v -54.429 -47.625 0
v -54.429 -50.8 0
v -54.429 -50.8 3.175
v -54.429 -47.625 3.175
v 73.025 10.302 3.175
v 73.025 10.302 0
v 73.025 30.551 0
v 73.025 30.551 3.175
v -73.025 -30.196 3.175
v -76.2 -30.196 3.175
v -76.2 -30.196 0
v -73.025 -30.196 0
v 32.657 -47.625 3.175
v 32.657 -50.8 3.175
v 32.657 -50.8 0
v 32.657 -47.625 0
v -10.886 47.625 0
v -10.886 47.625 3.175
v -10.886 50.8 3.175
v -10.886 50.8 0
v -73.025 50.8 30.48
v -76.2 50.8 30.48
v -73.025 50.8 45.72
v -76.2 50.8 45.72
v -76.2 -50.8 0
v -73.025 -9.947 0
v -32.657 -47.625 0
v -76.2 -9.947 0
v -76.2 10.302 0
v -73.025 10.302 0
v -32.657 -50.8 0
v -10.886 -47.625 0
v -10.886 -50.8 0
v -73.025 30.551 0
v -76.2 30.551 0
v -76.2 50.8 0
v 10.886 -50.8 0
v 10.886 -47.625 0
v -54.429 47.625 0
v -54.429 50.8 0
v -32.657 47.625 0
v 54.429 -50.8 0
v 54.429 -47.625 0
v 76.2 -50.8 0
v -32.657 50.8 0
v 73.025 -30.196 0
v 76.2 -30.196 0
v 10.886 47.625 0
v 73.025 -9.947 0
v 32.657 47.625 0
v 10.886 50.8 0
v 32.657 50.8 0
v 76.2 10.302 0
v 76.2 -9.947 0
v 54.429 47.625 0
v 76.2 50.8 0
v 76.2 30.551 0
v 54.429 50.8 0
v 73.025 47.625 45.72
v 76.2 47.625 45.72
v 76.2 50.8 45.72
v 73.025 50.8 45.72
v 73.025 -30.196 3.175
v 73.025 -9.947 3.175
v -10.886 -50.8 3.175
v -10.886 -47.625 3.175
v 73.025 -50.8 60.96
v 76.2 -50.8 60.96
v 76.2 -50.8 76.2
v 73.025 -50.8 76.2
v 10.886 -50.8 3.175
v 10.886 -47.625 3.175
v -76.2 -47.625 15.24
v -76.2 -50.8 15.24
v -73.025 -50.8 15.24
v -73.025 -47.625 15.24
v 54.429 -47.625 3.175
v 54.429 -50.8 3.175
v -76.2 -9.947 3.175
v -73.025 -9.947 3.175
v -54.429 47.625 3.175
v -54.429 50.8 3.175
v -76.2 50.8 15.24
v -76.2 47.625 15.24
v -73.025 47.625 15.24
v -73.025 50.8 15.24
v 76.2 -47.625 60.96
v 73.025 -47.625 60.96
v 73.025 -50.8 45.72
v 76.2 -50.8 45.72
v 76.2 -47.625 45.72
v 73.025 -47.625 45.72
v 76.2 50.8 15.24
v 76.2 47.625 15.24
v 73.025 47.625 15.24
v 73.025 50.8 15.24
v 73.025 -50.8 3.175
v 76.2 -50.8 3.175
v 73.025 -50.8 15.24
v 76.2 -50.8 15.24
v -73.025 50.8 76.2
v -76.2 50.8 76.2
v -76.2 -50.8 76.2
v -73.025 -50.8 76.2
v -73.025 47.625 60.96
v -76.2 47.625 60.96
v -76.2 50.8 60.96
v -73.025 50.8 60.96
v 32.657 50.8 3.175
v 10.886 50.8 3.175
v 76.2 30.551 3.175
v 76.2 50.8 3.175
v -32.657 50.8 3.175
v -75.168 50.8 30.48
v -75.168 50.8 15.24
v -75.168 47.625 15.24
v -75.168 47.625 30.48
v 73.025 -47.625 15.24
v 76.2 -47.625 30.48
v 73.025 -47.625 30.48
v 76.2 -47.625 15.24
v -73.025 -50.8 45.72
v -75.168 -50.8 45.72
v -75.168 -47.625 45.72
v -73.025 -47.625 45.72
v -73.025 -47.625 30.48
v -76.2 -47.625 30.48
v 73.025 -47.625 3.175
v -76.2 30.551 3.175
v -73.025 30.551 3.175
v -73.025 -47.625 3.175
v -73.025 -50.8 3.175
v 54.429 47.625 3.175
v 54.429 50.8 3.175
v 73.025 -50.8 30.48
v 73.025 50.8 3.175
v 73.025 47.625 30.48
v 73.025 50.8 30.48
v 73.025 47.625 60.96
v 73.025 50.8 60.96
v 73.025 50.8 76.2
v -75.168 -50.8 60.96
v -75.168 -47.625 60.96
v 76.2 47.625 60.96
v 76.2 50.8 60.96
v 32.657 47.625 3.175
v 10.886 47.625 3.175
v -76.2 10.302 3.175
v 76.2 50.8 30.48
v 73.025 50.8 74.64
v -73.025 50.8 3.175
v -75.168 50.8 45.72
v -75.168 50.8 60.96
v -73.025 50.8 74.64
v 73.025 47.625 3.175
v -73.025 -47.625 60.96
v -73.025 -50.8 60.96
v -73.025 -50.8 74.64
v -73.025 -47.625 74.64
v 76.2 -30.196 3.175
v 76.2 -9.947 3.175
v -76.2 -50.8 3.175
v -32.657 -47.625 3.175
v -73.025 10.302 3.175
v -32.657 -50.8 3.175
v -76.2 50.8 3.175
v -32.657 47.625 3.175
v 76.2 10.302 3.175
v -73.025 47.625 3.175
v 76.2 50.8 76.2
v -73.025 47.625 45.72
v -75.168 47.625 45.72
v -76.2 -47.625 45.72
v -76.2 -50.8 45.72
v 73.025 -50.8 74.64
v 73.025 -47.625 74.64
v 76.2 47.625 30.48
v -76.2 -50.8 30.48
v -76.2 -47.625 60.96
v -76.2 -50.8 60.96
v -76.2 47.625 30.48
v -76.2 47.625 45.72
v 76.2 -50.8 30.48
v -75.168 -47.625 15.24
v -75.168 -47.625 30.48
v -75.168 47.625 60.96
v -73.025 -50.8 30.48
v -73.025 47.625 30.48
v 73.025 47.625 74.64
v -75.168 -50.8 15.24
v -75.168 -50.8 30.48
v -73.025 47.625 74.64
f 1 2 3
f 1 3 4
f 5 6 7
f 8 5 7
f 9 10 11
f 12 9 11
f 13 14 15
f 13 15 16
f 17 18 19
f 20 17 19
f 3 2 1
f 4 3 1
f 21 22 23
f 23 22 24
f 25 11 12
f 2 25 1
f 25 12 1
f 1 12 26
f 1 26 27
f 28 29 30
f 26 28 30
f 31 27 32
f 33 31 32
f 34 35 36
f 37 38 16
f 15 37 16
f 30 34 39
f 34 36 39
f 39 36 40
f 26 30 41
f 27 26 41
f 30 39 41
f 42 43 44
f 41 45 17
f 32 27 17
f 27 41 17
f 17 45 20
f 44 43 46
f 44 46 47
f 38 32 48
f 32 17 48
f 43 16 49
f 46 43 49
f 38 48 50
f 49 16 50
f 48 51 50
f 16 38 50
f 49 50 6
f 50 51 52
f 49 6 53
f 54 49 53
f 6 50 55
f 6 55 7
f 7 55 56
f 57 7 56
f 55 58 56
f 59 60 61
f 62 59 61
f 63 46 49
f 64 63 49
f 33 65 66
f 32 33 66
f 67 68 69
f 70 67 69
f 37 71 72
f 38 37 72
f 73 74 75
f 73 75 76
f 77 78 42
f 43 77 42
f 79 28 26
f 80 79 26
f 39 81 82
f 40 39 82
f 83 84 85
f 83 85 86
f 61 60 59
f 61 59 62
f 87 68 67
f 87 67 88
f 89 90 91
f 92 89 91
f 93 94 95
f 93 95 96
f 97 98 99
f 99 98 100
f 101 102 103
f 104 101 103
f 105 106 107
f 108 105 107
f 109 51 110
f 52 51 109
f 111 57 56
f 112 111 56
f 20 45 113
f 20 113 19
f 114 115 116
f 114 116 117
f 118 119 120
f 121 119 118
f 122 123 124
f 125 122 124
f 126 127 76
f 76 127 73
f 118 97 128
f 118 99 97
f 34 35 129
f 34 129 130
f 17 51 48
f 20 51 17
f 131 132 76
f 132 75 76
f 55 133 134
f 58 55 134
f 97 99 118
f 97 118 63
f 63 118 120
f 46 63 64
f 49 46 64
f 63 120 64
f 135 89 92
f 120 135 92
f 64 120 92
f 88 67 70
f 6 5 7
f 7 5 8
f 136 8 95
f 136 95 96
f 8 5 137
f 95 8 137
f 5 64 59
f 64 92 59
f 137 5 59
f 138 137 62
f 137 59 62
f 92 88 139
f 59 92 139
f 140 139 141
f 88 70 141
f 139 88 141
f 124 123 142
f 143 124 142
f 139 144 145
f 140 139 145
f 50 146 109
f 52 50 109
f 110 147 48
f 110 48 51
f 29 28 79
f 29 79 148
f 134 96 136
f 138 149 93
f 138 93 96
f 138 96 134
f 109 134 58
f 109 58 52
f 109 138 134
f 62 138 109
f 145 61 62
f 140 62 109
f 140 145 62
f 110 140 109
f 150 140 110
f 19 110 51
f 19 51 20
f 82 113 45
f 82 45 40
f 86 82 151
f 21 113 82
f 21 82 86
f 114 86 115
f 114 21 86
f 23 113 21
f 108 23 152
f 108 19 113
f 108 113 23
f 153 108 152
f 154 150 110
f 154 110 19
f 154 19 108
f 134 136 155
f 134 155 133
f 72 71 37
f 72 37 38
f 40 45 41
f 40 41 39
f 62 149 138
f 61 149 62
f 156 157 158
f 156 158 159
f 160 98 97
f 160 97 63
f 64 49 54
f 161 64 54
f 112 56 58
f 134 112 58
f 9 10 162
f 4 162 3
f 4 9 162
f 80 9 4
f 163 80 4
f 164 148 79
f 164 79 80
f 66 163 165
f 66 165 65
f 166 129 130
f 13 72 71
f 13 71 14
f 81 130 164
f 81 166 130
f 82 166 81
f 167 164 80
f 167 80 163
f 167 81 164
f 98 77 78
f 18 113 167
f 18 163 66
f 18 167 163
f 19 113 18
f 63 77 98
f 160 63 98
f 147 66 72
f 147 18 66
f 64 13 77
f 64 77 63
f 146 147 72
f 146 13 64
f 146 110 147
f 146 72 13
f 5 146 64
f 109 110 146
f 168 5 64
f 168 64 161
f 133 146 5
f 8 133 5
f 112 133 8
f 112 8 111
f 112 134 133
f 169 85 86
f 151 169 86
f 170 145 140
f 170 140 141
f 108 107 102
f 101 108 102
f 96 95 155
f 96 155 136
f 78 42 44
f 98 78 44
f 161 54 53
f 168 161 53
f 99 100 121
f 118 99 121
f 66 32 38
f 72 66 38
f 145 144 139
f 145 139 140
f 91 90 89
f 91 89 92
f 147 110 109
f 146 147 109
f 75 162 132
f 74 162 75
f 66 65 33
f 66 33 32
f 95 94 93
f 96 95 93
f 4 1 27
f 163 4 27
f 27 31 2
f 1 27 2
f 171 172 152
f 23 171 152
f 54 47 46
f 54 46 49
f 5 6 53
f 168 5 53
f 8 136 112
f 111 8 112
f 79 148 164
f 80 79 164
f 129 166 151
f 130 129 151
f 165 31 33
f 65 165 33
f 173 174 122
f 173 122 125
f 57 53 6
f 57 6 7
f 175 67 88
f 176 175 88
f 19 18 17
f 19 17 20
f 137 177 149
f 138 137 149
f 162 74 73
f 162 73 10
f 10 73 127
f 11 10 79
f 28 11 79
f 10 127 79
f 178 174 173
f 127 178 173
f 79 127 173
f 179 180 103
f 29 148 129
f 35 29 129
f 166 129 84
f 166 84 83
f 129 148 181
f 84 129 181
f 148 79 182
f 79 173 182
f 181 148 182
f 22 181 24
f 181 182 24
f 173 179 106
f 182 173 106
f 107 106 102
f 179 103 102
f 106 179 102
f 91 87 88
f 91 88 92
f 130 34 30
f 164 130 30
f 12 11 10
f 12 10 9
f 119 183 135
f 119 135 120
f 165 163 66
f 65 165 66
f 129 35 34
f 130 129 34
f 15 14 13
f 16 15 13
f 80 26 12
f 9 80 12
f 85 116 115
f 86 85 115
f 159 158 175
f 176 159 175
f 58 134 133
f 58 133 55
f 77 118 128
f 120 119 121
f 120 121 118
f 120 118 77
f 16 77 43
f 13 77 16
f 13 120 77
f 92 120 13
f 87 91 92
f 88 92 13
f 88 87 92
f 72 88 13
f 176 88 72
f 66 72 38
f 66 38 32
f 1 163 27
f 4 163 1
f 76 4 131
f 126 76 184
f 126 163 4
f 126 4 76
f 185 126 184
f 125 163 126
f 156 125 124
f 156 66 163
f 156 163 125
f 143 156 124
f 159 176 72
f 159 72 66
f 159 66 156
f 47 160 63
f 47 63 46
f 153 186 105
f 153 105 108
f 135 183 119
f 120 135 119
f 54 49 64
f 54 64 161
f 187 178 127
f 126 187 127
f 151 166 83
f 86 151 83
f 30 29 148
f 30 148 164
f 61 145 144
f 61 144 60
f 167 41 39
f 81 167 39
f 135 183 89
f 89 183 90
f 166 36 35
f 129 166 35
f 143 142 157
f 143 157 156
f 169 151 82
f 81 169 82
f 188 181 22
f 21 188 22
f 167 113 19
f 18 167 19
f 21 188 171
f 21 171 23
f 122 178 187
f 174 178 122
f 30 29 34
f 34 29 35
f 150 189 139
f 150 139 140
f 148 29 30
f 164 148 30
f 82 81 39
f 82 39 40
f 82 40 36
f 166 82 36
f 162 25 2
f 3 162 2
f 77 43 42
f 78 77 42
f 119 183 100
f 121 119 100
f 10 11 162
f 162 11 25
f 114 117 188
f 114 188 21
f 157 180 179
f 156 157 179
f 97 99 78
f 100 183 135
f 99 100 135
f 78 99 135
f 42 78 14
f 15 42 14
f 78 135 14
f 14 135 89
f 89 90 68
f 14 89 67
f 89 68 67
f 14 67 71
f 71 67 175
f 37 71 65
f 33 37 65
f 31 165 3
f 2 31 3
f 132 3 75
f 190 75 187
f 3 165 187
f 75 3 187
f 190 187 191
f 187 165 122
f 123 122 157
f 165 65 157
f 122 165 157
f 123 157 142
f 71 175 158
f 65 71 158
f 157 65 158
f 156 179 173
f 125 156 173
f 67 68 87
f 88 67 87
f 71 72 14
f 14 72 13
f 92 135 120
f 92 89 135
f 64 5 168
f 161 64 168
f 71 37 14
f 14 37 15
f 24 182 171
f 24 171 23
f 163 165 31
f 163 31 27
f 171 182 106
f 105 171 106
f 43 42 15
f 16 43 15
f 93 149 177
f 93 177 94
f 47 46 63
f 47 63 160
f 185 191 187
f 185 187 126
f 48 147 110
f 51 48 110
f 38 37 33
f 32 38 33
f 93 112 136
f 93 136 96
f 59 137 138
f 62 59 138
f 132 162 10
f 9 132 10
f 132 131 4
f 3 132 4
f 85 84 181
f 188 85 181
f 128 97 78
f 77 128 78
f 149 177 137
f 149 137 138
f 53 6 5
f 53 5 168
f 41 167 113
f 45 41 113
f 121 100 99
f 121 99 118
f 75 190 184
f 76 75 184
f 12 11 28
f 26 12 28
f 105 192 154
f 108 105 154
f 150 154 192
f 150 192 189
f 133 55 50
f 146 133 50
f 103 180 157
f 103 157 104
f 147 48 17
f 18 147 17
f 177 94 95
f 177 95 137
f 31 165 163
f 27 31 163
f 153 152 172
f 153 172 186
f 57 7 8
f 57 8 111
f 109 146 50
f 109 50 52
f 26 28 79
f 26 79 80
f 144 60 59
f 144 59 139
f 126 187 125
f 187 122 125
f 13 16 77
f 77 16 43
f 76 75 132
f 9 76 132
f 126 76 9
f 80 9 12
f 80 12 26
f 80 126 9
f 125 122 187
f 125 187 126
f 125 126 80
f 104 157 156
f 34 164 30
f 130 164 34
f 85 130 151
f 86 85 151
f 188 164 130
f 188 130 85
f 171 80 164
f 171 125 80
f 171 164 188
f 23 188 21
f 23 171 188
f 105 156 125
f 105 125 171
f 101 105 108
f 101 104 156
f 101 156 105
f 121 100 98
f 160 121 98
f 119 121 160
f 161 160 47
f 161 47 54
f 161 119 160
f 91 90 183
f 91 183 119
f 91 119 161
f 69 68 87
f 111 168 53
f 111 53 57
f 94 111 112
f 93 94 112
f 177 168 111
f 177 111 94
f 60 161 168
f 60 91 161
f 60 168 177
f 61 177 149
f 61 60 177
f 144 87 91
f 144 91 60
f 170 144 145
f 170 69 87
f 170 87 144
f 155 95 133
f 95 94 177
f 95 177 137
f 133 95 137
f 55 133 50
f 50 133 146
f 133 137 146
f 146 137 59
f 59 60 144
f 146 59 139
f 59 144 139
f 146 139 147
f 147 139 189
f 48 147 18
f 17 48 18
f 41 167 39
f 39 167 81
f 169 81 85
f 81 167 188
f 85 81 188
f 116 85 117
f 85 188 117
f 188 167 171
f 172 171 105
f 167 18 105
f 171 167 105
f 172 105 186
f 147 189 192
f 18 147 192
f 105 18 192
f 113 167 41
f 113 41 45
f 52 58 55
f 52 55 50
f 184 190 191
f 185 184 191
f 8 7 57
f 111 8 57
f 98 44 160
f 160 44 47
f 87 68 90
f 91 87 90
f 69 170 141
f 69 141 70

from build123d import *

# Parameters (mm, degrees)
F0_W     = 3.175
F0_H     = 17.074
F0_W_2   = 18.5964285714
F0_H_2   = 3.175
F0_W_3   = 21.7714285714
F0_H_3   = 20.249
F0_H_4   = 17.429
F0_H_5   = 2.82
F1_DEPTH = 3.175
F2_W     = 3.175
F2_H     = 15.24
F2_H_2   = 12.065
F3_DEPTH = 3.175
F7_DEPTH = 3.175


with BuildPart() as f1:
    # F0 (on Top) → F1 (new body)
    with BuildSketch(Plane.XY):
        with Locations((-74.6125, 39.088)):
            Rectangle(F0_W, F0_H)
        with Locations((-63.7267857143, 49.2125)):
            Rectangle(F0_W_2, F0_H_2)
        with Locations((-74.6125, 49.2125)):
            Rectangle(F0_W, F0_H_2)
        with Locations((-21.7714285714, 49.2125)):
            Rectangle(F0_W_3, F0_H_2)
        Polygon((73.025, 30.551), (73.025, 47.625), (54.4285714286, 47.625), (32.6571428571, 47.625), (10.8857142857, 47.625), (-10.8857142857, 47.625), (-32.6571428571, 47.625), (-54.4285714286, 47.625), (-73.025, 47.625), (-73.025, 30.551), (-73.025, 10.302), (-73.025, -9.947), (-73.025, -30.196), (-73.025, -47.625), (-54.4285714286, -47.625), (-32.6571428571, -47.625), (-10.8857142857, -47.625), (10.8857142857, -47.625), (32.6571428571, -47.625), (54.4285714286, -47.625), (73.025, -47.625), (73.025, -30.196), (73.025, -9.947), (73.025, 10.302), align=None)
        with Locations((21.7714285714, 49.2125)):
            Rectangle(F0_W_3, F0_H_2)
        with Locations((63.7267857143, 49.2125)):
            Rectangle(F0_W_2, F0_H_2)
        with Locations((74.6125, 49.2125)):
            Rectangle(F0_W, F0_H_2)
        with Locations((74.6125, 39.088)):
            Rectangle(F0_W, F0_H)
        with Locations((74.6125, 0.1775)):
            Rectangle(F0_W, F0_H_3)
        with Locations((74.6125, -38.9105)):
            Rectangle(F0_W, F0_H_4)
        with Locations((74.6125, -49.035)):
            Rectangle(F0_W, F0_H_5)
        Polygon((73.025, -50.445), (73.025, -47.625), (54.4285714286, -47.625), (54.4285714286, -50.8), (73.025, -50.8), (76.2, -50.8), (76.2, -50.445), align=None)
        with Locations((21.7714285714, -49.2125)):
            Rectangle(F0_W_3, F0_H_2)
        with Locations((-21.7714285714, -49.2125)):
            Rectangle(F0_W_3, F0_H_2)
        Polygon((-54.4285714286, -50.8), (-54.4285714286, -47.625), (-73.025, -47.625), (-73.025, -50.445), (-76.2, -50.445), (-76.2, -50.8), (-73.025, -50.8), align=None)
        with Locations((-74.6125, -49.035)):
            Rectangle(F0_W, F0_H_5)
        with Locations((-74.6125, -38.9105)):
            Rectangle(F0_W, F0_H_4)
        with Locations((-74.6125, 0.1775)):
            Rectangle(F0_W, F0_H_3)
    extrude(amount=F1_DEPTH)


with BuildPart() as f3:
    # F2 (on face) → F3 (new body)
    with BuildSketch(Plane.YZ.offset(76.2)):
        Polygon((-30.196, 3.175), (-30.196, 0), (47.625, 0), (47.625, 15.24), (47.625, 30.48), (47.625, 45.72), (47.625, 60.96), (47.625, 76.2), (-47.625, 76.2), (-47.625, 60.96), (-47.625, 45.72), (-47.625, 30.48), (-47.625, 15.24), (-47.625, 3.175), align=None)
        with Locations((-49.2125, 68.58)):
            Rectangle(F2_W, F2_H)
        with Locations((-49.2125, 38.1)):
            Rectangle(F2_W, F2_H)
        with Locations((-49.2125, 9.2075)):
            Rectangle(F2_W, F2_H_2)
        with Locations((49.2125, 68.58)):
            Rectangle(F2_W, F2_H)
        with Locations((49.2125, 38.1)):
            Rectangle(F2_W, F2_H)
        with Locations((49.2125, 7.62)):
            Rectangle(F2_W, F2_H)
    extrude(amount=-F3_DEPTH)


with BuildPart() as f4_1:
    # F4: instance of F3
    add(f3.part.mirror(Plane.YZ))

    # F5: cut F1
    add(f1.part, mode=Mode.SUBTRACT)


with BuildPart() as f3_1:
    add(f3.part)

    # F5: cut F1
    add(f1.part, mode=Mode.SUBTRACT)


with BuildPart() as f7:
    # F6 (on face) → F7 (new body)
    with BuildSketch(Plane(origin=(0, 50.8, 0), x_dir=(-1, 0, 0), z_dir=(0, 1, 0))):
        Polygon((75.1678422093, 74.6399760246), (-76.2, 74.6399760246), (-76.2, 3.175), (-54.4285714286, 3.175), (-54.4285714286, 0), (75.1678422093, 0), align=None)
    extrude(amount=-F7_DEPTH)


with BuildPart() as f8_1:
    # F8: instance of F7
    add(f7.part.mirror(Plane.XZ))

    # F9: cut F3, F1, F4_1
    add(f3_1.part, mode=Mode.SUBTRACT)
    add(f1.part, mode=Mode.SUBTRACT)
    add(f4_1.part, mode=Mode.SUBTRACT)


with BuildPart() as f7_1:
    add(f7.part)

    # F9: cut F3, F1, F4_1
    add(f3_1.part, mode=Mode.SUBTRACT)
    add(f1.part, mode=Mode.SUBTRACT)
    add(f4_1.part, mode=Mode.SUBTRACT)


solid = Compound([f1.part, f4_1.part, f3_1.part, f8_1.part, f7_1.part])
